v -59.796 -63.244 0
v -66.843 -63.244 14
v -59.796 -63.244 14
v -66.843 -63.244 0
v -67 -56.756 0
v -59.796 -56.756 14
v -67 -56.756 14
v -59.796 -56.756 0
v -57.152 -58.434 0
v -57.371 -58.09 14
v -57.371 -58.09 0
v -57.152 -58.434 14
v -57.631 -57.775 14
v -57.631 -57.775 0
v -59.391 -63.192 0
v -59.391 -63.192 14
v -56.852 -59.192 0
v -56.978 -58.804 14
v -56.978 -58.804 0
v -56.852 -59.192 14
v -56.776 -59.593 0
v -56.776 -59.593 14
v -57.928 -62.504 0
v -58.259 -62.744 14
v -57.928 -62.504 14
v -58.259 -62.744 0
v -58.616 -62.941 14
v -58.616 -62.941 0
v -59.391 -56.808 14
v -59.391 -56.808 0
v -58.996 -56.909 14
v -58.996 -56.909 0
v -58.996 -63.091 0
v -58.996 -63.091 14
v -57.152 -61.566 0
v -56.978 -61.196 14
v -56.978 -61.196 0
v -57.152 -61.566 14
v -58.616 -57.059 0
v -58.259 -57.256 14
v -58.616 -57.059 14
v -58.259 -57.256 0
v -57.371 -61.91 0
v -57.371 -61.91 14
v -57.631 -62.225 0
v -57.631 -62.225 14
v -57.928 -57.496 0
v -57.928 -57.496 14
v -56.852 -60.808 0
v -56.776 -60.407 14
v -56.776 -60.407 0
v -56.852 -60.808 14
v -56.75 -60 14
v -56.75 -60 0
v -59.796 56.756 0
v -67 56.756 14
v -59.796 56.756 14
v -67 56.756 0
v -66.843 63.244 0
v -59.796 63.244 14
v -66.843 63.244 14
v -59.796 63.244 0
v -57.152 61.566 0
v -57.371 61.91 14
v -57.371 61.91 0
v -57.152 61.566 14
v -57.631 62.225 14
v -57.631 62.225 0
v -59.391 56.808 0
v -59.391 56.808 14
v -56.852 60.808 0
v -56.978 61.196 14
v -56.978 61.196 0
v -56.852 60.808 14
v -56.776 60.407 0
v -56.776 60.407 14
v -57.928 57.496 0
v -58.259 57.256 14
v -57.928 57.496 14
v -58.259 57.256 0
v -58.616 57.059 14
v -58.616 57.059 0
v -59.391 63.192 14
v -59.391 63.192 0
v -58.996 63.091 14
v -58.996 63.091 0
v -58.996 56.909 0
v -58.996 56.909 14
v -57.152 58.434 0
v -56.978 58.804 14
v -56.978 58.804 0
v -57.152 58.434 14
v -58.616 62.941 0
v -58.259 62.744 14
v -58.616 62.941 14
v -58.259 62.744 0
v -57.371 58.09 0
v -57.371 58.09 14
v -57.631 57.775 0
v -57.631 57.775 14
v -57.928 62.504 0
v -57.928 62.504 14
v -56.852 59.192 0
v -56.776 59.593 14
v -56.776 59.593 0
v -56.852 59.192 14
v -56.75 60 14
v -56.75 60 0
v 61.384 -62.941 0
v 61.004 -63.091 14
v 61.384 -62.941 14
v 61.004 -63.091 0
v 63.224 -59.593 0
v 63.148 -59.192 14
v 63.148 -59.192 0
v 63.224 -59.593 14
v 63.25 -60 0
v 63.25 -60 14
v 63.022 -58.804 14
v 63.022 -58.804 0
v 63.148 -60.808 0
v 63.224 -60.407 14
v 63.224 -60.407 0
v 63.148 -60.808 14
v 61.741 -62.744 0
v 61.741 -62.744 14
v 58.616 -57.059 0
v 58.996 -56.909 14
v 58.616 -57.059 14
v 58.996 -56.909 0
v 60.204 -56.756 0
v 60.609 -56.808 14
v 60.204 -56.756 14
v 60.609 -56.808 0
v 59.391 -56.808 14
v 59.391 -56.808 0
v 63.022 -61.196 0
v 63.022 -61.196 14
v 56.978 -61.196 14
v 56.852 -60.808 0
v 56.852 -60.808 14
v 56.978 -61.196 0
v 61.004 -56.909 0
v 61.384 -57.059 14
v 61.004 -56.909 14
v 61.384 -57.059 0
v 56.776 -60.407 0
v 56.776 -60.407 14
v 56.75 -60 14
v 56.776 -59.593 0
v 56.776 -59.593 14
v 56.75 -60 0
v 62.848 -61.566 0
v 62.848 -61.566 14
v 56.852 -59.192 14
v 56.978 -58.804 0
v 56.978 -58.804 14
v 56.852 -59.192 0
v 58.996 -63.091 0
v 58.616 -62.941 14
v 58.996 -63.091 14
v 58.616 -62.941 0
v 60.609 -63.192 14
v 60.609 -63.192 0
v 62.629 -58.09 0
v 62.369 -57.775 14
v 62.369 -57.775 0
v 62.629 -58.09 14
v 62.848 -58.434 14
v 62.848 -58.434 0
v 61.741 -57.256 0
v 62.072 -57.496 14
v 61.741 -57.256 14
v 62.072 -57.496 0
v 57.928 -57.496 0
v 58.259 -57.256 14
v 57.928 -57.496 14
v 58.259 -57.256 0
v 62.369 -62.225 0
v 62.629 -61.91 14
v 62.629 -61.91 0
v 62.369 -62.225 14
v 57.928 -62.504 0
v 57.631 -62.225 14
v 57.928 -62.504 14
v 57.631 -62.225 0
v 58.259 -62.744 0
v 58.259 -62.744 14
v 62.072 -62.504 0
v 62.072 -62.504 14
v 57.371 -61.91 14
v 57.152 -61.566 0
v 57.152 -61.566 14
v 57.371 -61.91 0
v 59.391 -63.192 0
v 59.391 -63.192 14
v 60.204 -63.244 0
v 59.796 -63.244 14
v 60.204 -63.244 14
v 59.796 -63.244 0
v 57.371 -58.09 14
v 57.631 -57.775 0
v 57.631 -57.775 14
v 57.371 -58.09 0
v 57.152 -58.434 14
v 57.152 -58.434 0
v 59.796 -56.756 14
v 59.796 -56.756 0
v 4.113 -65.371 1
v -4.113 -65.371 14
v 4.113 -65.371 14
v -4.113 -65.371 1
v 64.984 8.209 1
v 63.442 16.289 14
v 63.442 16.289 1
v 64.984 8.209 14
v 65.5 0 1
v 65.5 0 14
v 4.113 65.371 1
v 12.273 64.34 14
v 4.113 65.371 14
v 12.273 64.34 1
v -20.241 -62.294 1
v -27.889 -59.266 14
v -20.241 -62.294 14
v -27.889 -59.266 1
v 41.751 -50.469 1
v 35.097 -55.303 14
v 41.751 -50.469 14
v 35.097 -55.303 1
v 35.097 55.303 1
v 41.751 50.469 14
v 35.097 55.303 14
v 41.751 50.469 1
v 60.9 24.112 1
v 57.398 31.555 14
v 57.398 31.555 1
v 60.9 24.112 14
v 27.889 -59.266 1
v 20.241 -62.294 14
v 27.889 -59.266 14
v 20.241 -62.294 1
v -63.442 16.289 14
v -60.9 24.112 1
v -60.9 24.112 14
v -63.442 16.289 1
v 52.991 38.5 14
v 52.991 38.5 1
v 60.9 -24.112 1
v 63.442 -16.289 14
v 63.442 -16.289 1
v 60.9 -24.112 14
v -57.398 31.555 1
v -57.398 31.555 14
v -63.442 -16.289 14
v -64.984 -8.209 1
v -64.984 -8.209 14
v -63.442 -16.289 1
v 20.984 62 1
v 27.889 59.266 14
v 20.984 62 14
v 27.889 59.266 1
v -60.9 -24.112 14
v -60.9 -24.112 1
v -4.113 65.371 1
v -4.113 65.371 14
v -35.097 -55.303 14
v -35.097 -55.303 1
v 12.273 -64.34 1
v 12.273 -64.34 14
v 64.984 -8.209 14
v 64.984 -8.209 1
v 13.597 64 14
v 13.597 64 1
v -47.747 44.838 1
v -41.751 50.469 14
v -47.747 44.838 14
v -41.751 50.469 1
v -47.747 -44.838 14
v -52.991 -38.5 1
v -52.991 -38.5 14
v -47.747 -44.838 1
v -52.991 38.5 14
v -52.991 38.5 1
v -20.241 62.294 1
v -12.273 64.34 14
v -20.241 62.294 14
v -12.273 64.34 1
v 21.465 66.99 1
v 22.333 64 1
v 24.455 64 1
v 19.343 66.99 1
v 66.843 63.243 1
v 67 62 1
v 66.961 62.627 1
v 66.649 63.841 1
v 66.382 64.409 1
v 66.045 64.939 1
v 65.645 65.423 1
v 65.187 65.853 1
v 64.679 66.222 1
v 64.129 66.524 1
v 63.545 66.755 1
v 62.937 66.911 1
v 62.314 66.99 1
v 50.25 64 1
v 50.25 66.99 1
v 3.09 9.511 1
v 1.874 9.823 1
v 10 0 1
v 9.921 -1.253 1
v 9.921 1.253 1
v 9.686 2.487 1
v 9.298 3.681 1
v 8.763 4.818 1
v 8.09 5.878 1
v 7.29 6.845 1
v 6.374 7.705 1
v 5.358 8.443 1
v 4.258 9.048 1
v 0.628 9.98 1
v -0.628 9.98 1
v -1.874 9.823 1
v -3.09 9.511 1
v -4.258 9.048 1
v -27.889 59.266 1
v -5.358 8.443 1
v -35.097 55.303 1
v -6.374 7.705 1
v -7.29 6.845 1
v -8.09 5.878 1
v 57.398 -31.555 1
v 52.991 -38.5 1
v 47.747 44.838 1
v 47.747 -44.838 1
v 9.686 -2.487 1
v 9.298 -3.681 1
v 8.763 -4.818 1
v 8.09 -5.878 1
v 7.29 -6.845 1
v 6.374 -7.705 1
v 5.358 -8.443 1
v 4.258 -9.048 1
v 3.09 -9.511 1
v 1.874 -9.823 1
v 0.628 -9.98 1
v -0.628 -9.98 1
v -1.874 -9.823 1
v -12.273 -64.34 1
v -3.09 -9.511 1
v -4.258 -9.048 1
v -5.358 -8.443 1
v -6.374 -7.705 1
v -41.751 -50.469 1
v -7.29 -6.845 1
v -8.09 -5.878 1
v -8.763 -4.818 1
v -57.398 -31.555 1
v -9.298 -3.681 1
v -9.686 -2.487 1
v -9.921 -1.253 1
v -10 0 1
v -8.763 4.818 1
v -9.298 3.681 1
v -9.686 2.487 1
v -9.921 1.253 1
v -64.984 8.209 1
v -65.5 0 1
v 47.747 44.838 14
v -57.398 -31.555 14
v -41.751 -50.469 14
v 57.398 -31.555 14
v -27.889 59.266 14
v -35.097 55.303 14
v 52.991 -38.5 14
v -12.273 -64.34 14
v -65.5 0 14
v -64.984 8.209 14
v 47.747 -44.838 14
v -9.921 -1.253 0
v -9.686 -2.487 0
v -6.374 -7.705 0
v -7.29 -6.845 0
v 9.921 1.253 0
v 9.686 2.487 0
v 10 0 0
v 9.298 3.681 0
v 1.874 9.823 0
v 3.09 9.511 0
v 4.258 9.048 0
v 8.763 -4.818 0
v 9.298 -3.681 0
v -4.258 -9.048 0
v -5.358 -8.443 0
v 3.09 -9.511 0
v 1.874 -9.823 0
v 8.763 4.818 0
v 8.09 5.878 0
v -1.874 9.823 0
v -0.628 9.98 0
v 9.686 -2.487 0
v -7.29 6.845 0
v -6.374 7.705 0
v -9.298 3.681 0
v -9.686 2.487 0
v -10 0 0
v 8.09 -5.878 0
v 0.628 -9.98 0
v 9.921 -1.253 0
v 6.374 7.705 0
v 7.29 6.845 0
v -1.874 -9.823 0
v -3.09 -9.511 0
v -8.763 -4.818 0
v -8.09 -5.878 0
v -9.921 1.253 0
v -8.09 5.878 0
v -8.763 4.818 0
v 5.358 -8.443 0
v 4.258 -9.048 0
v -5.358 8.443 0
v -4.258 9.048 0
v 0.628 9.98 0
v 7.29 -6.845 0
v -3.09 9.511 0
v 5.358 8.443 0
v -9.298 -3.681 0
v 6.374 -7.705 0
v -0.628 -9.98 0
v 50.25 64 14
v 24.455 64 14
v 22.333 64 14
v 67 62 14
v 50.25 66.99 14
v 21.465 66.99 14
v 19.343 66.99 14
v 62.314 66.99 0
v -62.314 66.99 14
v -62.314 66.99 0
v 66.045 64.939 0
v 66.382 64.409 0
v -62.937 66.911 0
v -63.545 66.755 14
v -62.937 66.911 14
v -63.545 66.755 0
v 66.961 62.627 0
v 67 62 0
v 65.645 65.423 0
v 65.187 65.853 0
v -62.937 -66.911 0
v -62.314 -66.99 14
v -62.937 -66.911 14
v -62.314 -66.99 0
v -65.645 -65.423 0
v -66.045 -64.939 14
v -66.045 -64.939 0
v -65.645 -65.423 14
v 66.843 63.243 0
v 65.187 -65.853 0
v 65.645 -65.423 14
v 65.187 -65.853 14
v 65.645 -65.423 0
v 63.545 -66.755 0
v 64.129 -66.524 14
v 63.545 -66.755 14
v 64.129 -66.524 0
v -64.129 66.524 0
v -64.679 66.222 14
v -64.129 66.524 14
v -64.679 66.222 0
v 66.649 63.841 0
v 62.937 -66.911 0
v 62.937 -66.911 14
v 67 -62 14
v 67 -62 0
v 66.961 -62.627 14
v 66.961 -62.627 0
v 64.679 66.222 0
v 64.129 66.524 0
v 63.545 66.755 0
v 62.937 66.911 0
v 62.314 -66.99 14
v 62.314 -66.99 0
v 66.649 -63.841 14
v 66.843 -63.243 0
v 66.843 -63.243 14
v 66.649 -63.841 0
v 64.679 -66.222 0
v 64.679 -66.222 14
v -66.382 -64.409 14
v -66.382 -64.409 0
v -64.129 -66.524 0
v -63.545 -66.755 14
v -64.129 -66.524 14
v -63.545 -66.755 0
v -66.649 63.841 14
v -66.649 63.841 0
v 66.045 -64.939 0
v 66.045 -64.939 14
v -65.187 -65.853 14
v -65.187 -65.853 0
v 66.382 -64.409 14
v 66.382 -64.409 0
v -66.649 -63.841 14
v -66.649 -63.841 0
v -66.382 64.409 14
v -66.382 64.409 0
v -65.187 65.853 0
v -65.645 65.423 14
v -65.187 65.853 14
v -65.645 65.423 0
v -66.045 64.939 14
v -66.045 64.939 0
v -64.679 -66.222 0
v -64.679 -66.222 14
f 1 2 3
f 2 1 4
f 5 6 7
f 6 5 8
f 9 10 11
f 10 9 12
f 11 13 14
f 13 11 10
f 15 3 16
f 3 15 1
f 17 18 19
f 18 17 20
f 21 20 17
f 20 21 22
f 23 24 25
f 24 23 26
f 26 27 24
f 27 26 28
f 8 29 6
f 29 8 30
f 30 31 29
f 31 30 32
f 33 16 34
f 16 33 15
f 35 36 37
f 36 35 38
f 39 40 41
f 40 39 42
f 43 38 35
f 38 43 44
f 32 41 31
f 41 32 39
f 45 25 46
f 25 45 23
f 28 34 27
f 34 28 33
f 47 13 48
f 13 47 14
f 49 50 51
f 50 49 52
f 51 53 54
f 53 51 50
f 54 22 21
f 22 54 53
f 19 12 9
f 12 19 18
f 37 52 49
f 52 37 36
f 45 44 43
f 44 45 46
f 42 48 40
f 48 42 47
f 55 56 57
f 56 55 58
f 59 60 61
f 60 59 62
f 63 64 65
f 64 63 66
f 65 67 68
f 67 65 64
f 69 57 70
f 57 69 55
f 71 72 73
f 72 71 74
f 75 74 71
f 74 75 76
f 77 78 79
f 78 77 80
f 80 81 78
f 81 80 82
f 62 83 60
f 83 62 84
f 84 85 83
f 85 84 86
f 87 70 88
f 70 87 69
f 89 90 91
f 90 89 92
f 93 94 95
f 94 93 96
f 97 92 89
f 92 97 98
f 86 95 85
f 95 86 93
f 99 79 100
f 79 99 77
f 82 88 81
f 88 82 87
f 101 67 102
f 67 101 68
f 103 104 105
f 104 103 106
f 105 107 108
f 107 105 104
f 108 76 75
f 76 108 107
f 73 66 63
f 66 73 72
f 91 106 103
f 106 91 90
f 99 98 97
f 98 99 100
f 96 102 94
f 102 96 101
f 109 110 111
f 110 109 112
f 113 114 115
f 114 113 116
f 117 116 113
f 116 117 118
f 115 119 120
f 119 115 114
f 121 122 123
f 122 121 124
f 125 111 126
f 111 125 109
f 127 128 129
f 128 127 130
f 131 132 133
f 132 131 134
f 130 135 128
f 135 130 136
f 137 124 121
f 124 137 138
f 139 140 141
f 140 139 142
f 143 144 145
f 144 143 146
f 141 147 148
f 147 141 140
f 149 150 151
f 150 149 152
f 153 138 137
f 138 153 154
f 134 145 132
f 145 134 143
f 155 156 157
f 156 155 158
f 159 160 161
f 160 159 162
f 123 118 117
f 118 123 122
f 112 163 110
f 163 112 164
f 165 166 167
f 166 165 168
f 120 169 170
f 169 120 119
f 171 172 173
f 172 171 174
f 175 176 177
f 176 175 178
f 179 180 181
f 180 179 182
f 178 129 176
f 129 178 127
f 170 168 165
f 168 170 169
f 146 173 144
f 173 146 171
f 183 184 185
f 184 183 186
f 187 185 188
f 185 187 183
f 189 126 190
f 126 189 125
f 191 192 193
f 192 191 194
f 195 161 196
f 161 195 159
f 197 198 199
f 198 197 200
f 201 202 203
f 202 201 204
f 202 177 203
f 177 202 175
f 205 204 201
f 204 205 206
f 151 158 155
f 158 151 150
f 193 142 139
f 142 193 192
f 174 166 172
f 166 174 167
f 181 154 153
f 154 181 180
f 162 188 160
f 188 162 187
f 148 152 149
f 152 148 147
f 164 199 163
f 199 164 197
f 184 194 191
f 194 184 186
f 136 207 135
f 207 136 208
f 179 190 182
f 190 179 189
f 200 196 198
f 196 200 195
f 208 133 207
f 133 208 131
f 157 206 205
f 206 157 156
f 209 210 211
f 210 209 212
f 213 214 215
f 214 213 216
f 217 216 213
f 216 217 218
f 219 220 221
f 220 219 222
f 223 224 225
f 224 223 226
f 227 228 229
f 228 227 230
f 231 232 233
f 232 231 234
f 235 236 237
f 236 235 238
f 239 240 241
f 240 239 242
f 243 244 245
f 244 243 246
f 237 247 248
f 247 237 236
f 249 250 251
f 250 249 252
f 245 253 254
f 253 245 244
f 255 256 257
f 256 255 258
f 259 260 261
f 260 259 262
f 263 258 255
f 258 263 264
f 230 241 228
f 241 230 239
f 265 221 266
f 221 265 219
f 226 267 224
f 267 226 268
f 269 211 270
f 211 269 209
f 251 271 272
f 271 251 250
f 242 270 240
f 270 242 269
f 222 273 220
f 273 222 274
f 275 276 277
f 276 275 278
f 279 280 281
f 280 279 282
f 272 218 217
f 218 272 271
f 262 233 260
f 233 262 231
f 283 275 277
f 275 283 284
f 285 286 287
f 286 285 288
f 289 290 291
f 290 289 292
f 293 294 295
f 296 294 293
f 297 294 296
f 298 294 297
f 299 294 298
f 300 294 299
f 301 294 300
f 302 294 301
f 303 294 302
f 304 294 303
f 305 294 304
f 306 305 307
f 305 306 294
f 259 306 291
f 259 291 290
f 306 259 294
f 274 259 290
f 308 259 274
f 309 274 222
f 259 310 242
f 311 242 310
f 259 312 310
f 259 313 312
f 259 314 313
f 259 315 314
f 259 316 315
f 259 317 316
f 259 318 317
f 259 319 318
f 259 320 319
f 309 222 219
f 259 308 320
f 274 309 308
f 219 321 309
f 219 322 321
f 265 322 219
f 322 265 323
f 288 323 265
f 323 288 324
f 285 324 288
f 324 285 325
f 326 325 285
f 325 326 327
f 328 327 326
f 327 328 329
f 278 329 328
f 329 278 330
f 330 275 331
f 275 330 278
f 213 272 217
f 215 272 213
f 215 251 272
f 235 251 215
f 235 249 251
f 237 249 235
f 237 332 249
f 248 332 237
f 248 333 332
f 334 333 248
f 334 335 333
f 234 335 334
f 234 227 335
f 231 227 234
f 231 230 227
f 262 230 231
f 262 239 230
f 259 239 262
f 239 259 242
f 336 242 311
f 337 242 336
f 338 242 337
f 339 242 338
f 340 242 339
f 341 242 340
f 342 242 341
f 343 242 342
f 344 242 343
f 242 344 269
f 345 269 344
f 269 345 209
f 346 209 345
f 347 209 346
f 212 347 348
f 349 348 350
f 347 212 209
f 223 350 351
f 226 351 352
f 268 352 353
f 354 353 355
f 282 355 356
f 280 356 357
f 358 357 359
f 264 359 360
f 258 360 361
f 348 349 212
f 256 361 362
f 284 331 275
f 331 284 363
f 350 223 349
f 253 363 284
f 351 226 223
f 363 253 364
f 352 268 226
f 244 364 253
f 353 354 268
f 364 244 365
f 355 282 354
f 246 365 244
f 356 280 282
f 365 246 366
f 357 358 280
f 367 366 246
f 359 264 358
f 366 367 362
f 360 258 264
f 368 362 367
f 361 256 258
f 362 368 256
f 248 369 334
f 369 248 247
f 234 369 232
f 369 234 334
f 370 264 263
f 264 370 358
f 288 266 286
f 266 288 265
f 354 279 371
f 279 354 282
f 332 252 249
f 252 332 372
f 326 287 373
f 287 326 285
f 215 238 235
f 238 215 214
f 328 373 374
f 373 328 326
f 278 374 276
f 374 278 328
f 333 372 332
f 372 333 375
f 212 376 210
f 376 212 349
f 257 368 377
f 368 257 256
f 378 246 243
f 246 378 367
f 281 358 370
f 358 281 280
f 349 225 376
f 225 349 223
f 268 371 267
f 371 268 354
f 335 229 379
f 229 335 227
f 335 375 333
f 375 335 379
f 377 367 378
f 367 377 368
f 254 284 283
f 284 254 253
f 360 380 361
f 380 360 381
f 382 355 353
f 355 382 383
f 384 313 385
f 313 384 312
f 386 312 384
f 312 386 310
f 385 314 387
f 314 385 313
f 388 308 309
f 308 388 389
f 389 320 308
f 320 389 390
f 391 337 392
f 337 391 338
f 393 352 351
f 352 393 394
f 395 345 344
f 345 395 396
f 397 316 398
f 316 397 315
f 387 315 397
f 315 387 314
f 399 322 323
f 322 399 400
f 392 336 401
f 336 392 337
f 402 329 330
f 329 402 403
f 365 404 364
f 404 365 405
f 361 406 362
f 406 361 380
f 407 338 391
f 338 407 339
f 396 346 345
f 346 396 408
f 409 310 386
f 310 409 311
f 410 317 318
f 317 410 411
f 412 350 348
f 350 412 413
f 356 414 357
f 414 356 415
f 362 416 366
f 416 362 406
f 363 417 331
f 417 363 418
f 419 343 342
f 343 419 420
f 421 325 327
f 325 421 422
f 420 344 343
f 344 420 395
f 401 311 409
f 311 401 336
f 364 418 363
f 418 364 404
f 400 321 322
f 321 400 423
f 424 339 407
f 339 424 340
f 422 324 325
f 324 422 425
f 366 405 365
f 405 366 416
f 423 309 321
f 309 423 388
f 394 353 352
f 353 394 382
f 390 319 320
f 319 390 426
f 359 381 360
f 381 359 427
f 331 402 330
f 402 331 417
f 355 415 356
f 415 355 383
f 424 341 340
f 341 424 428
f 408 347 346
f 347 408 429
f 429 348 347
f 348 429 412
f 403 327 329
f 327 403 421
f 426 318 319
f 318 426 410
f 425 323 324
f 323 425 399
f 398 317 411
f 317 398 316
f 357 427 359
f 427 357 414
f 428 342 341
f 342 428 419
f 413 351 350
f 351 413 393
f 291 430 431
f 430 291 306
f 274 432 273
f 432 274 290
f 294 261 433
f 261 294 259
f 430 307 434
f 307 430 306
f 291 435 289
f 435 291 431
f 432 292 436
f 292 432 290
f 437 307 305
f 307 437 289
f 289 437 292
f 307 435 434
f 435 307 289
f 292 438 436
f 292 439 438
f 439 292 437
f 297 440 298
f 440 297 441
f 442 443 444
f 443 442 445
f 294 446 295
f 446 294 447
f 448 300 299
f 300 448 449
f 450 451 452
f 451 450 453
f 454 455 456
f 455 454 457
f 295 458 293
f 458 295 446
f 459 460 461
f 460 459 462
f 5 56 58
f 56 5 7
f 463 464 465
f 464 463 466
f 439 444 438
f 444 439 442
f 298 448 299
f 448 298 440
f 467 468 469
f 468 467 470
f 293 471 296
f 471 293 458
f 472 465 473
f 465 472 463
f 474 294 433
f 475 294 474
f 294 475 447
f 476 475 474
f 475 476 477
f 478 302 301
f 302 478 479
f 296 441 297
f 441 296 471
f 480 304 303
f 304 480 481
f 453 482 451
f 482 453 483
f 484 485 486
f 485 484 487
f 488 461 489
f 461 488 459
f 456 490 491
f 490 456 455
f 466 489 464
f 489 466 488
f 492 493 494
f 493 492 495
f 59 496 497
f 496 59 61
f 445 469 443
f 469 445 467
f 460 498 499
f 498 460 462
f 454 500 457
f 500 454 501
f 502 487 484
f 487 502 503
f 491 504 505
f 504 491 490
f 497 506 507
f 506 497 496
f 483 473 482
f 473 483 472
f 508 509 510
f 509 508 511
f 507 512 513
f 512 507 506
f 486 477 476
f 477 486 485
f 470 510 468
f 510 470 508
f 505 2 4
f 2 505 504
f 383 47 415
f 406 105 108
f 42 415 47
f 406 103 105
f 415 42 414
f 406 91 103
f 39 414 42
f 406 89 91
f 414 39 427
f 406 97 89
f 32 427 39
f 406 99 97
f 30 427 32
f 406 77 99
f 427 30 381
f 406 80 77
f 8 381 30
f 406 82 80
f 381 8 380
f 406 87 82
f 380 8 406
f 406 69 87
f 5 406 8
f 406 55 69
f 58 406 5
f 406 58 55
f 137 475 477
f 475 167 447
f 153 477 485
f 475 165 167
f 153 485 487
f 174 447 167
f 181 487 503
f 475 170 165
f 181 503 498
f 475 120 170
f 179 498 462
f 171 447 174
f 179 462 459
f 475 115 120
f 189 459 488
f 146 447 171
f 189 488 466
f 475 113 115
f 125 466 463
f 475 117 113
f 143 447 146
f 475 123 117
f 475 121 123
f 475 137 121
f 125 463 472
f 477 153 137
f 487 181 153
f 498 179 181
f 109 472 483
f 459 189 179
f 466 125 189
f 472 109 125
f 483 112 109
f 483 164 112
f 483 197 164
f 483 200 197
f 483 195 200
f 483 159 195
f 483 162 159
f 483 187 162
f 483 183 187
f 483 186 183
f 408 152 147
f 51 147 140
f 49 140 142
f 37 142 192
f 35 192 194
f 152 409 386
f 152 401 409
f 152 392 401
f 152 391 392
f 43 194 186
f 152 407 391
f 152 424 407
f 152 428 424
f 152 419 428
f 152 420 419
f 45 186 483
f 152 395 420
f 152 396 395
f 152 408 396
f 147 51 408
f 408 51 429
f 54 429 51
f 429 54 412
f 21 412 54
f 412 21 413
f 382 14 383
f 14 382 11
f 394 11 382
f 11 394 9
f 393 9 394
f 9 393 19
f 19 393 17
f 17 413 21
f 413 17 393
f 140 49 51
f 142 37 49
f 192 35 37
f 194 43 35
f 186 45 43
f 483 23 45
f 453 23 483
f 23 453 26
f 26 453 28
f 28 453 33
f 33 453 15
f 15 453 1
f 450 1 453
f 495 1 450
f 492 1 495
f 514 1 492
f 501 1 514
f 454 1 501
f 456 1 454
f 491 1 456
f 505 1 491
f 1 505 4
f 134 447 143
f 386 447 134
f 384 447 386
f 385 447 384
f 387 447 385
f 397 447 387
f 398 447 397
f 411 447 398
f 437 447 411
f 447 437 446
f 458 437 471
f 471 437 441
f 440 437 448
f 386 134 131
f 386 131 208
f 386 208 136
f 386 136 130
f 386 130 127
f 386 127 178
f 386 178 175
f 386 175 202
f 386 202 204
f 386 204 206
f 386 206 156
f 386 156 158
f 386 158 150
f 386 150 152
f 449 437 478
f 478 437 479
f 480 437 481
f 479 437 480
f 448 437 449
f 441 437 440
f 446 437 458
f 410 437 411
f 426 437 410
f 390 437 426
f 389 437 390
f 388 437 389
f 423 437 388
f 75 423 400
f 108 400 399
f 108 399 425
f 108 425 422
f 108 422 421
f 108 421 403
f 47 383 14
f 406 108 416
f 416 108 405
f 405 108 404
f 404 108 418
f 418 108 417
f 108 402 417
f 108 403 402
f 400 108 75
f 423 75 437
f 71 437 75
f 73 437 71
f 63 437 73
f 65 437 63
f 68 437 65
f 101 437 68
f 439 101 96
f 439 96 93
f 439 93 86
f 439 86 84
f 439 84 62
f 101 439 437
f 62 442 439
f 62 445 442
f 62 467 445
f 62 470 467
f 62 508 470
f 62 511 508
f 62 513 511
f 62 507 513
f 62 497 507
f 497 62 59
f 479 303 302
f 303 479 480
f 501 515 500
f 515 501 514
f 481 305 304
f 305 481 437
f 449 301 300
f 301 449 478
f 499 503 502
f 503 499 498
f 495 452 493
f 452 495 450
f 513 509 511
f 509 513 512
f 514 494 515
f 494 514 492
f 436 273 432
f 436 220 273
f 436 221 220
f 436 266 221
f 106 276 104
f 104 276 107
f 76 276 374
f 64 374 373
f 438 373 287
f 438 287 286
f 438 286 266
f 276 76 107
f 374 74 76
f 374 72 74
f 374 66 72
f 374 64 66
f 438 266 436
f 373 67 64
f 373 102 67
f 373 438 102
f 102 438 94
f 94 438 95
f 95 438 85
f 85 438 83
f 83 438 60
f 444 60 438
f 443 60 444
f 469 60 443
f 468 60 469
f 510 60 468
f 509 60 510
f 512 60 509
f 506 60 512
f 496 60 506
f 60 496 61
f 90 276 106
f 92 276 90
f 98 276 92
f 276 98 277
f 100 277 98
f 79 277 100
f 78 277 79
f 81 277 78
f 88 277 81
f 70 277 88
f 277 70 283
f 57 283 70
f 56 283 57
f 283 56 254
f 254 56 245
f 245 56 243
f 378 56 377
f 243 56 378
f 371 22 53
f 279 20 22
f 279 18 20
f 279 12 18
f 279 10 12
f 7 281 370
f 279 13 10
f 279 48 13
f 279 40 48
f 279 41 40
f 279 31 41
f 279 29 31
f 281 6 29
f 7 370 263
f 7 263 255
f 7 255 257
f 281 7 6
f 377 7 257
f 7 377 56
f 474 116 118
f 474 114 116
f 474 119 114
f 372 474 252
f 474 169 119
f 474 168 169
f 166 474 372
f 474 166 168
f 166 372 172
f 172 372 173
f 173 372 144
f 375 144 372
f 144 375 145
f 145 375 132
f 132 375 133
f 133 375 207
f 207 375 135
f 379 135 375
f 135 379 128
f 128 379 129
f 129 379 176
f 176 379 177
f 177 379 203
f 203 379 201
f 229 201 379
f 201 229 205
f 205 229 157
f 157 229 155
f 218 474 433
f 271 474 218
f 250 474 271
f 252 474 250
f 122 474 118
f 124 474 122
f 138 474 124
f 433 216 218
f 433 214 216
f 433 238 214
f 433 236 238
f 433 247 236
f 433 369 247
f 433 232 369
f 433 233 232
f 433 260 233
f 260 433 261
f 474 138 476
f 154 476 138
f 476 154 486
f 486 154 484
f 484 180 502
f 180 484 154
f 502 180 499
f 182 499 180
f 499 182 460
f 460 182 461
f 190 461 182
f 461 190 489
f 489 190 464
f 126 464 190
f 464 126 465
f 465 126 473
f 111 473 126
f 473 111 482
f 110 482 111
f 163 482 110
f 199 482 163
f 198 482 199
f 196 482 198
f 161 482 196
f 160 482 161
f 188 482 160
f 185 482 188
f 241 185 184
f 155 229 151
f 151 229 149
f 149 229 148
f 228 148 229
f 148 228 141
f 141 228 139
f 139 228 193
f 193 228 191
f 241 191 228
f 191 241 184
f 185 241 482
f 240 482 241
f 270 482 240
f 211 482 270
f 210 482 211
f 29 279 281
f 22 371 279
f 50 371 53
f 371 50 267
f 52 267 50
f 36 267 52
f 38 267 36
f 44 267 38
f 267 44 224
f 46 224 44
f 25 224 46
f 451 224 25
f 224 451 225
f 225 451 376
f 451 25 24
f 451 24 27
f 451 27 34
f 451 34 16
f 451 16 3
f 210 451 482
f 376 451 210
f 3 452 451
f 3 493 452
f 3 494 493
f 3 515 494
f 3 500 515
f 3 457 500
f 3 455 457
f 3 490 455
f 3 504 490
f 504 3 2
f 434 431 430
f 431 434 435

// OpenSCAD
$fn = 50;


difference() {
	union() {
		translate(v = [0, 0, 0]) {
			rotate(a = [0, 0, 0]) {
				hull() {
					translate(v = [-62.0000000000, 62.0000000000, 0]) {
						rotate(a = [0, 0, 0]) {
							translate(v = [0, 0, 0]) {
								rotate(a = [0, 0, 0]) {
									cylinder(h = 14, r = 5);
								}
							}
						}
					}
					translate(v = [62.0000000000, 62.0000000000, 0]) {
						rotate(a = [0, 0, 0]) {
							translate(v = [0, 0, 0]) {
								rotate(a = [0, 0, 0]) {
									cylinder(h = 14, r = 5);
								}
							}
						}
					}
					translate(v = [-62.0000000000, -62.0000000000, 0]) {
						rotate(a = [0, 0, 0]) {
							translate(v = [0, 0, 0]) {
								rotate(a = [0, 0, 0]) {
									cylinder(h = 14, r = 5);
								}
							}
						}
					}
					translate(v = [62.0000000000, -62.0000000000, 0]) {
						rotate(a = [0, 0, 0]) {
							translate(v = [0, 0, 0]) {
								rotate(a = [0, 0, 0]) {
									cylinder(h = 14, r = 5);
								}
							}
						}
					}
				}
			}
		}
	}
	union() {
		translate(v = [-67.5000000000, -60.0000000000, -125]) {
			rotate(a = [0, 0, 0]) {
				hull() {
					translate(v = [7.5000000000, 0, 0]) {
						rotate(a = [0, 0, 0]) {
							translate(v = [0, 0, 0]) {
								rotate(a = [0, 0, 0]) {
									cylinder(h = 250, r = 3.2500000000);
								}
							}
						}
					}
					translate(v = [-7.5000000000, 0, 0]) {
						rotate(a = [0, 0, 0]) {
							translate(v = [0, 0, 0]) {
								rotate(a = [0, 0, 0]) {
									cylinder(h = 250, r = 3.2500000000);
								}
							}
						}
					}
				}
			}
		}
		translate(v = [-67.5000000000, 60.0000000000, -125]) {
			rotate(a = [0, 0, 0]) {
				hull() {
					translate(v = [7.5000000000, 0, 0]) {
						rotate(a = [0, 0, 0]) {
							translate(v = [0, 0, 0]) {
								rotate(a = [0, 0, 0]) {
									cylinder(h = 250, r = 3.2500000000);
								}
							}
						}
					}
					translate(v = [-7.5000000000, 0, 0]) {
						rotate(a = [0, 0, 0]) {
							translate(v = [0, 0, 0]) {
								rotate(a = [0, 0, 0]) {
									cylinder(h = 250, r = 3.2500000000);
								}
							}
						}
					}
				}
			}
		}
		translate(v = [60.0000000000, -60.0000000000, -125.0000000000]) {
			rotate(a = [0, 0, 0]) {
				cylinder(h = 250, r = 3.2500000000);
			}
		}
		translate(v = [0, 0, 1.0000000000]) {
			rotate(a = [0, 0, 0]) {
				cylinder(h = 16, r = 65.5000000000);
			}
		}
		translate(v = [0, 0, -7.0000000000]) {
			rotate(a = [0, 0, 0]) {
				cylinder(h = 14, r = 10.0000000000);
			}
		}
		translate(v = [0.0000000000, 62.0000000000, 1]) {
			rotate(a = [0, 0, 0]) {
				cube(size = [67.0000000000, 2, 16]);
			}
		}
		translate(v = [50.2500000000, 62.0000000000, 1]) {
			rotate(a = [0, 0, 0]) {
				cube(size = [16.7500000000, 5, 16]);
			}
		}
		translate(v = [18.5833333333, 67.7500000000, 1]) {
			rotate(a = [0, 0, -45]) {
				cube(size = [7.5000000000, 1.5000000000, 16]);
			}
		}
	}
}
